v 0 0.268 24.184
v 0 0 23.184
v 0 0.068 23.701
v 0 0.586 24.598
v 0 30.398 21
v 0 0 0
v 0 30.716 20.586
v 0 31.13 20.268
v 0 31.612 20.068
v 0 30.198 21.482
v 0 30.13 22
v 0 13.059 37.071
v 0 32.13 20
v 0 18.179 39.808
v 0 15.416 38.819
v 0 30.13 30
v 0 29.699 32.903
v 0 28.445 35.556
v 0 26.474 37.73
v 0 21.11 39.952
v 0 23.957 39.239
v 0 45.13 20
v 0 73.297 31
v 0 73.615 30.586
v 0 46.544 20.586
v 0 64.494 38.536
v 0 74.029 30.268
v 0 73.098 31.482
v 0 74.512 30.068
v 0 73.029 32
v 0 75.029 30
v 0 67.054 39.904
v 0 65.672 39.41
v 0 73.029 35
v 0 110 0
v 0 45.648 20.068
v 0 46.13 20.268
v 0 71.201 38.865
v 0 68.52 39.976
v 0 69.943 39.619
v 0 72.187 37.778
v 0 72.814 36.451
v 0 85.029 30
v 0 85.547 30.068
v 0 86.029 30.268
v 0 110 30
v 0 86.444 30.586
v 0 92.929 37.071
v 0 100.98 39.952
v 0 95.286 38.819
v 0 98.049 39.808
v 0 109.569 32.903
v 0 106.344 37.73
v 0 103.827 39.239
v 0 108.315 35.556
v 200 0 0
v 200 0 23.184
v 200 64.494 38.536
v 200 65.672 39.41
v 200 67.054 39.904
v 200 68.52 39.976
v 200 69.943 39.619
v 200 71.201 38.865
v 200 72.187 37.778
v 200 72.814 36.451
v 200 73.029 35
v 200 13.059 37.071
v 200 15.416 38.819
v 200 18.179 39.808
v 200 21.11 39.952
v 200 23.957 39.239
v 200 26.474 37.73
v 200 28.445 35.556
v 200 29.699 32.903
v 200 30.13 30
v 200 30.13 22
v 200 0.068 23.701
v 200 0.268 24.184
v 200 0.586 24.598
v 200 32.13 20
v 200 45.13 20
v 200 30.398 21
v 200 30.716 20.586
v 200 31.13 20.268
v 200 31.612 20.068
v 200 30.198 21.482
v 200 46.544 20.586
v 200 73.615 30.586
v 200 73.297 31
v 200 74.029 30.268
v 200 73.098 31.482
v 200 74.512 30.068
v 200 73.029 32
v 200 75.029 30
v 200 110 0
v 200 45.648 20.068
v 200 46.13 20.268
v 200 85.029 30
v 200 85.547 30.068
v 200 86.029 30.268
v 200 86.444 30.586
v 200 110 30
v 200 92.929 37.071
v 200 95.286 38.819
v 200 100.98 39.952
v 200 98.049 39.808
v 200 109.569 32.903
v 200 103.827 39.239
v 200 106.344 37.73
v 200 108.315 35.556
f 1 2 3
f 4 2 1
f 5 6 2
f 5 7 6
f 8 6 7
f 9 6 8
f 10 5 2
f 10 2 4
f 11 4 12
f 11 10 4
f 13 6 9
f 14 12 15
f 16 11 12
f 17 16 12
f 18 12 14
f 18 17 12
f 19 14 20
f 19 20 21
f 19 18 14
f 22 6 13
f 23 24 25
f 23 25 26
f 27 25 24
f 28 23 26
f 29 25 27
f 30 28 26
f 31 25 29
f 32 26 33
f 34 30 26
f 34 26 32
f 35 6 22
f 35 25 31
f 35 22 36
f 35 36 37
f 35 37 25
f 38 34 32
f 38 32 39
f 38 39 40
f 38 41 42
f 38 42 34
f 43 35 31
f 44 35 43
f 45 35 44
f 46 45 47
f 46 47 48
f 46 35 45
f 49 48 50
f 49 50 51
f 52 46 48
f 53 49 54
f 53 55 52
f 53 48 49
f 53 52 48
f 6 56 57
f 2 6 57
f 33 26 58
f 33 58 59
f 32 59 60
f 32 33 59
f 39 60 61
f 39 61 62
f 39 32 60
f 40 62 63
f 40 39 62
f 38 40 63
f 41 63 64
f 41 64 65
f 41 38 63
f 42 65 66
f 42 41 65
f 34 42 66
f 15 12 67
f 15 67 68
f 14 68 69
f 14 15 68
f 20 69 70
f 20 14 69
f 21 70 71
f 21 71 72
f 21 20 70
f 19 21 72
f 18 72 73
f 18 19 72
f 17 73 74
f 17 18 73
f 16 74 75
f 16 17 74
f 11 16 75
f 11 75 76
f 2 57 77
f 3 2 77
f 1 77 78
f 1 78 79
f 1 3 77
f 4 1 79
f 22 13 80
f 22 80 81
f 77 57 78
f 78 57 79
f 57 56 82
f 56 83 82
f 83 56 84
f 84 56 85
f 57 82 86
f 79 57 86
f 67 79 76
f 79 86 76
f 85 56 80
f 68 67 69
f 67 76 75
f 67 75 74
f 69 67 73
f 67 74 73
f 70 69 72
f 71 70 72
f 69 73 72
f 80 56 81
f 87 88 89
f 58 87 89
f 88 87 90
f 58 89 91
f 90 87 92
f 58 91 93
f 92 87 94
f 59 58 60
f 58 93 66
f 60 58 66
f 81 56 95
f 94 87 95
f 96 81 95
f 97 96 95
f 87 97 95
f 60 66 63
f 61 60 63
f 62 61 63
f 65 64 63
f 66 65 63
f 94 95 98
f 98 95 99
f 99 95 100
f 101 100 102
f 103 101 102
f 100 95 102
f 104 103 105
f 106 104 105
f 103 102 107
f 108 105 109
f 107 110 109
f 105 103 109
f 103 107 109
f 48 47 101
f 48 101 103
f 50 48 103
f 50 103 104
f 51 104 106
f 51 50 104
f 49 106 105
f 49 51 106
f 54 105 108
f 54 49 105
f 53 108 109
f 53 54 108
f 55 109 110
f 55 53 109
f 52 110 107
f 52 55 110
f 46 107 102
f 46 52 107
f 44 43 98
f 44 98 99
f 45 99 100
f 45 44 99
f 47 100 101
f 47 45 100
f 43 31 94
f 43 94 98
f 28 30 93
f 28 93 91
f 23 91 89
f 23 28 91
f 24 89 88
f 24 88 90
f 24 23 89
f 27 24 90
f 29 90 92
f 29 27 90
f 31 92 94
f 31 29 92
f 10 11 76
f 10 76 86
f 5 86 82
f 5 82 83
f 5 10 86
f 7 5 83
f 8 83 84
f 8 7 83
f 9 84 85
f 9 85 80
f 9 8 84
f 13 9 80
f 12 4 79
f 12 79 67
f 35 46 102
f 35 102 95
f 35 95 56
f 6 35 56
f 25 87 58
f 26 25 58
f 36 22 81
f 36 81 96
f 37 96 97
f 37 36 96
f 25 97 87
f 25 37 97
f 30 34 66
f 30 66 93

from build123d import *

# Parameters (mm, degrees)
SALIENTE_EXTRUIR1_DEPTH = 200


with BuildPart() as part:
    # Croquis1 → Saliente-Extruir1 (new body)
    with BuildSketch(Plane(origin=(0, 0, 0), x_dir=(0, 0, -1), z_dir=(1, 0, 0))):
        with BuildLine():
            Line((0, 0), (-23.183766184, 0))
            ThreePointArc((-23.183766184, 0), (-23.949133049, 0.152240935), (-24.597979746, 0.585786438))
            Line((-24.597979746, 0.585786438), (-37.071067812, 13.058874503))
            ThreePointArc((-37.071067812, 13.058874503), (-39.238795325, 23.956776639), (-30, 30.129942315))
            Line((-30, 30.129942315), (-22, 30.129942315))
            ThreePointArc((-22, 30.129942315), (-20.585786438, 30.715728753), (-20, 32.129942315))
            Line((-20, 32.129942315), (-20, 45.129942315))
            ThreePointArc((-20, 45.129942315), (-20.152240935, 45.89530918), (-20.585786438, 46.544155877))
            Line((-20.585786438, 46.544155877), (-38.535533906, 64.493903346))
            ThreePointArc((-38.535533906, 64.493903346), (-39.619397663, 69.942854413), (-35, 73.029437252))
            Line((-35, 73.029437252), (-32, 73.029437252))
            ThreePointArc((-32, 73.029437252), (-30.585786438, 73.615223689), (-30, 75.029437252))
            Line((-30, 75.029437252), (-30, 85.029437252))
            ThreePointArc((-30, 85.029437252), (-30.152240935, 85.794804116), (-30.585786438, 86.443650814))
            Line((-30.585786438, 86.443650814), (-37.071067812, 92.928932188))
            ThreePointArc((-37.071067812, 92.928932188), (-39.238795325, 103.826834324), (-30, 110))
            Line((-30, 110), (0, 110))
            Line((0, 110), (0, 0))
        make_face()
    extrude(amount=SALIENTE_EXTRUIR1_DEPTH)


solid = part.part
